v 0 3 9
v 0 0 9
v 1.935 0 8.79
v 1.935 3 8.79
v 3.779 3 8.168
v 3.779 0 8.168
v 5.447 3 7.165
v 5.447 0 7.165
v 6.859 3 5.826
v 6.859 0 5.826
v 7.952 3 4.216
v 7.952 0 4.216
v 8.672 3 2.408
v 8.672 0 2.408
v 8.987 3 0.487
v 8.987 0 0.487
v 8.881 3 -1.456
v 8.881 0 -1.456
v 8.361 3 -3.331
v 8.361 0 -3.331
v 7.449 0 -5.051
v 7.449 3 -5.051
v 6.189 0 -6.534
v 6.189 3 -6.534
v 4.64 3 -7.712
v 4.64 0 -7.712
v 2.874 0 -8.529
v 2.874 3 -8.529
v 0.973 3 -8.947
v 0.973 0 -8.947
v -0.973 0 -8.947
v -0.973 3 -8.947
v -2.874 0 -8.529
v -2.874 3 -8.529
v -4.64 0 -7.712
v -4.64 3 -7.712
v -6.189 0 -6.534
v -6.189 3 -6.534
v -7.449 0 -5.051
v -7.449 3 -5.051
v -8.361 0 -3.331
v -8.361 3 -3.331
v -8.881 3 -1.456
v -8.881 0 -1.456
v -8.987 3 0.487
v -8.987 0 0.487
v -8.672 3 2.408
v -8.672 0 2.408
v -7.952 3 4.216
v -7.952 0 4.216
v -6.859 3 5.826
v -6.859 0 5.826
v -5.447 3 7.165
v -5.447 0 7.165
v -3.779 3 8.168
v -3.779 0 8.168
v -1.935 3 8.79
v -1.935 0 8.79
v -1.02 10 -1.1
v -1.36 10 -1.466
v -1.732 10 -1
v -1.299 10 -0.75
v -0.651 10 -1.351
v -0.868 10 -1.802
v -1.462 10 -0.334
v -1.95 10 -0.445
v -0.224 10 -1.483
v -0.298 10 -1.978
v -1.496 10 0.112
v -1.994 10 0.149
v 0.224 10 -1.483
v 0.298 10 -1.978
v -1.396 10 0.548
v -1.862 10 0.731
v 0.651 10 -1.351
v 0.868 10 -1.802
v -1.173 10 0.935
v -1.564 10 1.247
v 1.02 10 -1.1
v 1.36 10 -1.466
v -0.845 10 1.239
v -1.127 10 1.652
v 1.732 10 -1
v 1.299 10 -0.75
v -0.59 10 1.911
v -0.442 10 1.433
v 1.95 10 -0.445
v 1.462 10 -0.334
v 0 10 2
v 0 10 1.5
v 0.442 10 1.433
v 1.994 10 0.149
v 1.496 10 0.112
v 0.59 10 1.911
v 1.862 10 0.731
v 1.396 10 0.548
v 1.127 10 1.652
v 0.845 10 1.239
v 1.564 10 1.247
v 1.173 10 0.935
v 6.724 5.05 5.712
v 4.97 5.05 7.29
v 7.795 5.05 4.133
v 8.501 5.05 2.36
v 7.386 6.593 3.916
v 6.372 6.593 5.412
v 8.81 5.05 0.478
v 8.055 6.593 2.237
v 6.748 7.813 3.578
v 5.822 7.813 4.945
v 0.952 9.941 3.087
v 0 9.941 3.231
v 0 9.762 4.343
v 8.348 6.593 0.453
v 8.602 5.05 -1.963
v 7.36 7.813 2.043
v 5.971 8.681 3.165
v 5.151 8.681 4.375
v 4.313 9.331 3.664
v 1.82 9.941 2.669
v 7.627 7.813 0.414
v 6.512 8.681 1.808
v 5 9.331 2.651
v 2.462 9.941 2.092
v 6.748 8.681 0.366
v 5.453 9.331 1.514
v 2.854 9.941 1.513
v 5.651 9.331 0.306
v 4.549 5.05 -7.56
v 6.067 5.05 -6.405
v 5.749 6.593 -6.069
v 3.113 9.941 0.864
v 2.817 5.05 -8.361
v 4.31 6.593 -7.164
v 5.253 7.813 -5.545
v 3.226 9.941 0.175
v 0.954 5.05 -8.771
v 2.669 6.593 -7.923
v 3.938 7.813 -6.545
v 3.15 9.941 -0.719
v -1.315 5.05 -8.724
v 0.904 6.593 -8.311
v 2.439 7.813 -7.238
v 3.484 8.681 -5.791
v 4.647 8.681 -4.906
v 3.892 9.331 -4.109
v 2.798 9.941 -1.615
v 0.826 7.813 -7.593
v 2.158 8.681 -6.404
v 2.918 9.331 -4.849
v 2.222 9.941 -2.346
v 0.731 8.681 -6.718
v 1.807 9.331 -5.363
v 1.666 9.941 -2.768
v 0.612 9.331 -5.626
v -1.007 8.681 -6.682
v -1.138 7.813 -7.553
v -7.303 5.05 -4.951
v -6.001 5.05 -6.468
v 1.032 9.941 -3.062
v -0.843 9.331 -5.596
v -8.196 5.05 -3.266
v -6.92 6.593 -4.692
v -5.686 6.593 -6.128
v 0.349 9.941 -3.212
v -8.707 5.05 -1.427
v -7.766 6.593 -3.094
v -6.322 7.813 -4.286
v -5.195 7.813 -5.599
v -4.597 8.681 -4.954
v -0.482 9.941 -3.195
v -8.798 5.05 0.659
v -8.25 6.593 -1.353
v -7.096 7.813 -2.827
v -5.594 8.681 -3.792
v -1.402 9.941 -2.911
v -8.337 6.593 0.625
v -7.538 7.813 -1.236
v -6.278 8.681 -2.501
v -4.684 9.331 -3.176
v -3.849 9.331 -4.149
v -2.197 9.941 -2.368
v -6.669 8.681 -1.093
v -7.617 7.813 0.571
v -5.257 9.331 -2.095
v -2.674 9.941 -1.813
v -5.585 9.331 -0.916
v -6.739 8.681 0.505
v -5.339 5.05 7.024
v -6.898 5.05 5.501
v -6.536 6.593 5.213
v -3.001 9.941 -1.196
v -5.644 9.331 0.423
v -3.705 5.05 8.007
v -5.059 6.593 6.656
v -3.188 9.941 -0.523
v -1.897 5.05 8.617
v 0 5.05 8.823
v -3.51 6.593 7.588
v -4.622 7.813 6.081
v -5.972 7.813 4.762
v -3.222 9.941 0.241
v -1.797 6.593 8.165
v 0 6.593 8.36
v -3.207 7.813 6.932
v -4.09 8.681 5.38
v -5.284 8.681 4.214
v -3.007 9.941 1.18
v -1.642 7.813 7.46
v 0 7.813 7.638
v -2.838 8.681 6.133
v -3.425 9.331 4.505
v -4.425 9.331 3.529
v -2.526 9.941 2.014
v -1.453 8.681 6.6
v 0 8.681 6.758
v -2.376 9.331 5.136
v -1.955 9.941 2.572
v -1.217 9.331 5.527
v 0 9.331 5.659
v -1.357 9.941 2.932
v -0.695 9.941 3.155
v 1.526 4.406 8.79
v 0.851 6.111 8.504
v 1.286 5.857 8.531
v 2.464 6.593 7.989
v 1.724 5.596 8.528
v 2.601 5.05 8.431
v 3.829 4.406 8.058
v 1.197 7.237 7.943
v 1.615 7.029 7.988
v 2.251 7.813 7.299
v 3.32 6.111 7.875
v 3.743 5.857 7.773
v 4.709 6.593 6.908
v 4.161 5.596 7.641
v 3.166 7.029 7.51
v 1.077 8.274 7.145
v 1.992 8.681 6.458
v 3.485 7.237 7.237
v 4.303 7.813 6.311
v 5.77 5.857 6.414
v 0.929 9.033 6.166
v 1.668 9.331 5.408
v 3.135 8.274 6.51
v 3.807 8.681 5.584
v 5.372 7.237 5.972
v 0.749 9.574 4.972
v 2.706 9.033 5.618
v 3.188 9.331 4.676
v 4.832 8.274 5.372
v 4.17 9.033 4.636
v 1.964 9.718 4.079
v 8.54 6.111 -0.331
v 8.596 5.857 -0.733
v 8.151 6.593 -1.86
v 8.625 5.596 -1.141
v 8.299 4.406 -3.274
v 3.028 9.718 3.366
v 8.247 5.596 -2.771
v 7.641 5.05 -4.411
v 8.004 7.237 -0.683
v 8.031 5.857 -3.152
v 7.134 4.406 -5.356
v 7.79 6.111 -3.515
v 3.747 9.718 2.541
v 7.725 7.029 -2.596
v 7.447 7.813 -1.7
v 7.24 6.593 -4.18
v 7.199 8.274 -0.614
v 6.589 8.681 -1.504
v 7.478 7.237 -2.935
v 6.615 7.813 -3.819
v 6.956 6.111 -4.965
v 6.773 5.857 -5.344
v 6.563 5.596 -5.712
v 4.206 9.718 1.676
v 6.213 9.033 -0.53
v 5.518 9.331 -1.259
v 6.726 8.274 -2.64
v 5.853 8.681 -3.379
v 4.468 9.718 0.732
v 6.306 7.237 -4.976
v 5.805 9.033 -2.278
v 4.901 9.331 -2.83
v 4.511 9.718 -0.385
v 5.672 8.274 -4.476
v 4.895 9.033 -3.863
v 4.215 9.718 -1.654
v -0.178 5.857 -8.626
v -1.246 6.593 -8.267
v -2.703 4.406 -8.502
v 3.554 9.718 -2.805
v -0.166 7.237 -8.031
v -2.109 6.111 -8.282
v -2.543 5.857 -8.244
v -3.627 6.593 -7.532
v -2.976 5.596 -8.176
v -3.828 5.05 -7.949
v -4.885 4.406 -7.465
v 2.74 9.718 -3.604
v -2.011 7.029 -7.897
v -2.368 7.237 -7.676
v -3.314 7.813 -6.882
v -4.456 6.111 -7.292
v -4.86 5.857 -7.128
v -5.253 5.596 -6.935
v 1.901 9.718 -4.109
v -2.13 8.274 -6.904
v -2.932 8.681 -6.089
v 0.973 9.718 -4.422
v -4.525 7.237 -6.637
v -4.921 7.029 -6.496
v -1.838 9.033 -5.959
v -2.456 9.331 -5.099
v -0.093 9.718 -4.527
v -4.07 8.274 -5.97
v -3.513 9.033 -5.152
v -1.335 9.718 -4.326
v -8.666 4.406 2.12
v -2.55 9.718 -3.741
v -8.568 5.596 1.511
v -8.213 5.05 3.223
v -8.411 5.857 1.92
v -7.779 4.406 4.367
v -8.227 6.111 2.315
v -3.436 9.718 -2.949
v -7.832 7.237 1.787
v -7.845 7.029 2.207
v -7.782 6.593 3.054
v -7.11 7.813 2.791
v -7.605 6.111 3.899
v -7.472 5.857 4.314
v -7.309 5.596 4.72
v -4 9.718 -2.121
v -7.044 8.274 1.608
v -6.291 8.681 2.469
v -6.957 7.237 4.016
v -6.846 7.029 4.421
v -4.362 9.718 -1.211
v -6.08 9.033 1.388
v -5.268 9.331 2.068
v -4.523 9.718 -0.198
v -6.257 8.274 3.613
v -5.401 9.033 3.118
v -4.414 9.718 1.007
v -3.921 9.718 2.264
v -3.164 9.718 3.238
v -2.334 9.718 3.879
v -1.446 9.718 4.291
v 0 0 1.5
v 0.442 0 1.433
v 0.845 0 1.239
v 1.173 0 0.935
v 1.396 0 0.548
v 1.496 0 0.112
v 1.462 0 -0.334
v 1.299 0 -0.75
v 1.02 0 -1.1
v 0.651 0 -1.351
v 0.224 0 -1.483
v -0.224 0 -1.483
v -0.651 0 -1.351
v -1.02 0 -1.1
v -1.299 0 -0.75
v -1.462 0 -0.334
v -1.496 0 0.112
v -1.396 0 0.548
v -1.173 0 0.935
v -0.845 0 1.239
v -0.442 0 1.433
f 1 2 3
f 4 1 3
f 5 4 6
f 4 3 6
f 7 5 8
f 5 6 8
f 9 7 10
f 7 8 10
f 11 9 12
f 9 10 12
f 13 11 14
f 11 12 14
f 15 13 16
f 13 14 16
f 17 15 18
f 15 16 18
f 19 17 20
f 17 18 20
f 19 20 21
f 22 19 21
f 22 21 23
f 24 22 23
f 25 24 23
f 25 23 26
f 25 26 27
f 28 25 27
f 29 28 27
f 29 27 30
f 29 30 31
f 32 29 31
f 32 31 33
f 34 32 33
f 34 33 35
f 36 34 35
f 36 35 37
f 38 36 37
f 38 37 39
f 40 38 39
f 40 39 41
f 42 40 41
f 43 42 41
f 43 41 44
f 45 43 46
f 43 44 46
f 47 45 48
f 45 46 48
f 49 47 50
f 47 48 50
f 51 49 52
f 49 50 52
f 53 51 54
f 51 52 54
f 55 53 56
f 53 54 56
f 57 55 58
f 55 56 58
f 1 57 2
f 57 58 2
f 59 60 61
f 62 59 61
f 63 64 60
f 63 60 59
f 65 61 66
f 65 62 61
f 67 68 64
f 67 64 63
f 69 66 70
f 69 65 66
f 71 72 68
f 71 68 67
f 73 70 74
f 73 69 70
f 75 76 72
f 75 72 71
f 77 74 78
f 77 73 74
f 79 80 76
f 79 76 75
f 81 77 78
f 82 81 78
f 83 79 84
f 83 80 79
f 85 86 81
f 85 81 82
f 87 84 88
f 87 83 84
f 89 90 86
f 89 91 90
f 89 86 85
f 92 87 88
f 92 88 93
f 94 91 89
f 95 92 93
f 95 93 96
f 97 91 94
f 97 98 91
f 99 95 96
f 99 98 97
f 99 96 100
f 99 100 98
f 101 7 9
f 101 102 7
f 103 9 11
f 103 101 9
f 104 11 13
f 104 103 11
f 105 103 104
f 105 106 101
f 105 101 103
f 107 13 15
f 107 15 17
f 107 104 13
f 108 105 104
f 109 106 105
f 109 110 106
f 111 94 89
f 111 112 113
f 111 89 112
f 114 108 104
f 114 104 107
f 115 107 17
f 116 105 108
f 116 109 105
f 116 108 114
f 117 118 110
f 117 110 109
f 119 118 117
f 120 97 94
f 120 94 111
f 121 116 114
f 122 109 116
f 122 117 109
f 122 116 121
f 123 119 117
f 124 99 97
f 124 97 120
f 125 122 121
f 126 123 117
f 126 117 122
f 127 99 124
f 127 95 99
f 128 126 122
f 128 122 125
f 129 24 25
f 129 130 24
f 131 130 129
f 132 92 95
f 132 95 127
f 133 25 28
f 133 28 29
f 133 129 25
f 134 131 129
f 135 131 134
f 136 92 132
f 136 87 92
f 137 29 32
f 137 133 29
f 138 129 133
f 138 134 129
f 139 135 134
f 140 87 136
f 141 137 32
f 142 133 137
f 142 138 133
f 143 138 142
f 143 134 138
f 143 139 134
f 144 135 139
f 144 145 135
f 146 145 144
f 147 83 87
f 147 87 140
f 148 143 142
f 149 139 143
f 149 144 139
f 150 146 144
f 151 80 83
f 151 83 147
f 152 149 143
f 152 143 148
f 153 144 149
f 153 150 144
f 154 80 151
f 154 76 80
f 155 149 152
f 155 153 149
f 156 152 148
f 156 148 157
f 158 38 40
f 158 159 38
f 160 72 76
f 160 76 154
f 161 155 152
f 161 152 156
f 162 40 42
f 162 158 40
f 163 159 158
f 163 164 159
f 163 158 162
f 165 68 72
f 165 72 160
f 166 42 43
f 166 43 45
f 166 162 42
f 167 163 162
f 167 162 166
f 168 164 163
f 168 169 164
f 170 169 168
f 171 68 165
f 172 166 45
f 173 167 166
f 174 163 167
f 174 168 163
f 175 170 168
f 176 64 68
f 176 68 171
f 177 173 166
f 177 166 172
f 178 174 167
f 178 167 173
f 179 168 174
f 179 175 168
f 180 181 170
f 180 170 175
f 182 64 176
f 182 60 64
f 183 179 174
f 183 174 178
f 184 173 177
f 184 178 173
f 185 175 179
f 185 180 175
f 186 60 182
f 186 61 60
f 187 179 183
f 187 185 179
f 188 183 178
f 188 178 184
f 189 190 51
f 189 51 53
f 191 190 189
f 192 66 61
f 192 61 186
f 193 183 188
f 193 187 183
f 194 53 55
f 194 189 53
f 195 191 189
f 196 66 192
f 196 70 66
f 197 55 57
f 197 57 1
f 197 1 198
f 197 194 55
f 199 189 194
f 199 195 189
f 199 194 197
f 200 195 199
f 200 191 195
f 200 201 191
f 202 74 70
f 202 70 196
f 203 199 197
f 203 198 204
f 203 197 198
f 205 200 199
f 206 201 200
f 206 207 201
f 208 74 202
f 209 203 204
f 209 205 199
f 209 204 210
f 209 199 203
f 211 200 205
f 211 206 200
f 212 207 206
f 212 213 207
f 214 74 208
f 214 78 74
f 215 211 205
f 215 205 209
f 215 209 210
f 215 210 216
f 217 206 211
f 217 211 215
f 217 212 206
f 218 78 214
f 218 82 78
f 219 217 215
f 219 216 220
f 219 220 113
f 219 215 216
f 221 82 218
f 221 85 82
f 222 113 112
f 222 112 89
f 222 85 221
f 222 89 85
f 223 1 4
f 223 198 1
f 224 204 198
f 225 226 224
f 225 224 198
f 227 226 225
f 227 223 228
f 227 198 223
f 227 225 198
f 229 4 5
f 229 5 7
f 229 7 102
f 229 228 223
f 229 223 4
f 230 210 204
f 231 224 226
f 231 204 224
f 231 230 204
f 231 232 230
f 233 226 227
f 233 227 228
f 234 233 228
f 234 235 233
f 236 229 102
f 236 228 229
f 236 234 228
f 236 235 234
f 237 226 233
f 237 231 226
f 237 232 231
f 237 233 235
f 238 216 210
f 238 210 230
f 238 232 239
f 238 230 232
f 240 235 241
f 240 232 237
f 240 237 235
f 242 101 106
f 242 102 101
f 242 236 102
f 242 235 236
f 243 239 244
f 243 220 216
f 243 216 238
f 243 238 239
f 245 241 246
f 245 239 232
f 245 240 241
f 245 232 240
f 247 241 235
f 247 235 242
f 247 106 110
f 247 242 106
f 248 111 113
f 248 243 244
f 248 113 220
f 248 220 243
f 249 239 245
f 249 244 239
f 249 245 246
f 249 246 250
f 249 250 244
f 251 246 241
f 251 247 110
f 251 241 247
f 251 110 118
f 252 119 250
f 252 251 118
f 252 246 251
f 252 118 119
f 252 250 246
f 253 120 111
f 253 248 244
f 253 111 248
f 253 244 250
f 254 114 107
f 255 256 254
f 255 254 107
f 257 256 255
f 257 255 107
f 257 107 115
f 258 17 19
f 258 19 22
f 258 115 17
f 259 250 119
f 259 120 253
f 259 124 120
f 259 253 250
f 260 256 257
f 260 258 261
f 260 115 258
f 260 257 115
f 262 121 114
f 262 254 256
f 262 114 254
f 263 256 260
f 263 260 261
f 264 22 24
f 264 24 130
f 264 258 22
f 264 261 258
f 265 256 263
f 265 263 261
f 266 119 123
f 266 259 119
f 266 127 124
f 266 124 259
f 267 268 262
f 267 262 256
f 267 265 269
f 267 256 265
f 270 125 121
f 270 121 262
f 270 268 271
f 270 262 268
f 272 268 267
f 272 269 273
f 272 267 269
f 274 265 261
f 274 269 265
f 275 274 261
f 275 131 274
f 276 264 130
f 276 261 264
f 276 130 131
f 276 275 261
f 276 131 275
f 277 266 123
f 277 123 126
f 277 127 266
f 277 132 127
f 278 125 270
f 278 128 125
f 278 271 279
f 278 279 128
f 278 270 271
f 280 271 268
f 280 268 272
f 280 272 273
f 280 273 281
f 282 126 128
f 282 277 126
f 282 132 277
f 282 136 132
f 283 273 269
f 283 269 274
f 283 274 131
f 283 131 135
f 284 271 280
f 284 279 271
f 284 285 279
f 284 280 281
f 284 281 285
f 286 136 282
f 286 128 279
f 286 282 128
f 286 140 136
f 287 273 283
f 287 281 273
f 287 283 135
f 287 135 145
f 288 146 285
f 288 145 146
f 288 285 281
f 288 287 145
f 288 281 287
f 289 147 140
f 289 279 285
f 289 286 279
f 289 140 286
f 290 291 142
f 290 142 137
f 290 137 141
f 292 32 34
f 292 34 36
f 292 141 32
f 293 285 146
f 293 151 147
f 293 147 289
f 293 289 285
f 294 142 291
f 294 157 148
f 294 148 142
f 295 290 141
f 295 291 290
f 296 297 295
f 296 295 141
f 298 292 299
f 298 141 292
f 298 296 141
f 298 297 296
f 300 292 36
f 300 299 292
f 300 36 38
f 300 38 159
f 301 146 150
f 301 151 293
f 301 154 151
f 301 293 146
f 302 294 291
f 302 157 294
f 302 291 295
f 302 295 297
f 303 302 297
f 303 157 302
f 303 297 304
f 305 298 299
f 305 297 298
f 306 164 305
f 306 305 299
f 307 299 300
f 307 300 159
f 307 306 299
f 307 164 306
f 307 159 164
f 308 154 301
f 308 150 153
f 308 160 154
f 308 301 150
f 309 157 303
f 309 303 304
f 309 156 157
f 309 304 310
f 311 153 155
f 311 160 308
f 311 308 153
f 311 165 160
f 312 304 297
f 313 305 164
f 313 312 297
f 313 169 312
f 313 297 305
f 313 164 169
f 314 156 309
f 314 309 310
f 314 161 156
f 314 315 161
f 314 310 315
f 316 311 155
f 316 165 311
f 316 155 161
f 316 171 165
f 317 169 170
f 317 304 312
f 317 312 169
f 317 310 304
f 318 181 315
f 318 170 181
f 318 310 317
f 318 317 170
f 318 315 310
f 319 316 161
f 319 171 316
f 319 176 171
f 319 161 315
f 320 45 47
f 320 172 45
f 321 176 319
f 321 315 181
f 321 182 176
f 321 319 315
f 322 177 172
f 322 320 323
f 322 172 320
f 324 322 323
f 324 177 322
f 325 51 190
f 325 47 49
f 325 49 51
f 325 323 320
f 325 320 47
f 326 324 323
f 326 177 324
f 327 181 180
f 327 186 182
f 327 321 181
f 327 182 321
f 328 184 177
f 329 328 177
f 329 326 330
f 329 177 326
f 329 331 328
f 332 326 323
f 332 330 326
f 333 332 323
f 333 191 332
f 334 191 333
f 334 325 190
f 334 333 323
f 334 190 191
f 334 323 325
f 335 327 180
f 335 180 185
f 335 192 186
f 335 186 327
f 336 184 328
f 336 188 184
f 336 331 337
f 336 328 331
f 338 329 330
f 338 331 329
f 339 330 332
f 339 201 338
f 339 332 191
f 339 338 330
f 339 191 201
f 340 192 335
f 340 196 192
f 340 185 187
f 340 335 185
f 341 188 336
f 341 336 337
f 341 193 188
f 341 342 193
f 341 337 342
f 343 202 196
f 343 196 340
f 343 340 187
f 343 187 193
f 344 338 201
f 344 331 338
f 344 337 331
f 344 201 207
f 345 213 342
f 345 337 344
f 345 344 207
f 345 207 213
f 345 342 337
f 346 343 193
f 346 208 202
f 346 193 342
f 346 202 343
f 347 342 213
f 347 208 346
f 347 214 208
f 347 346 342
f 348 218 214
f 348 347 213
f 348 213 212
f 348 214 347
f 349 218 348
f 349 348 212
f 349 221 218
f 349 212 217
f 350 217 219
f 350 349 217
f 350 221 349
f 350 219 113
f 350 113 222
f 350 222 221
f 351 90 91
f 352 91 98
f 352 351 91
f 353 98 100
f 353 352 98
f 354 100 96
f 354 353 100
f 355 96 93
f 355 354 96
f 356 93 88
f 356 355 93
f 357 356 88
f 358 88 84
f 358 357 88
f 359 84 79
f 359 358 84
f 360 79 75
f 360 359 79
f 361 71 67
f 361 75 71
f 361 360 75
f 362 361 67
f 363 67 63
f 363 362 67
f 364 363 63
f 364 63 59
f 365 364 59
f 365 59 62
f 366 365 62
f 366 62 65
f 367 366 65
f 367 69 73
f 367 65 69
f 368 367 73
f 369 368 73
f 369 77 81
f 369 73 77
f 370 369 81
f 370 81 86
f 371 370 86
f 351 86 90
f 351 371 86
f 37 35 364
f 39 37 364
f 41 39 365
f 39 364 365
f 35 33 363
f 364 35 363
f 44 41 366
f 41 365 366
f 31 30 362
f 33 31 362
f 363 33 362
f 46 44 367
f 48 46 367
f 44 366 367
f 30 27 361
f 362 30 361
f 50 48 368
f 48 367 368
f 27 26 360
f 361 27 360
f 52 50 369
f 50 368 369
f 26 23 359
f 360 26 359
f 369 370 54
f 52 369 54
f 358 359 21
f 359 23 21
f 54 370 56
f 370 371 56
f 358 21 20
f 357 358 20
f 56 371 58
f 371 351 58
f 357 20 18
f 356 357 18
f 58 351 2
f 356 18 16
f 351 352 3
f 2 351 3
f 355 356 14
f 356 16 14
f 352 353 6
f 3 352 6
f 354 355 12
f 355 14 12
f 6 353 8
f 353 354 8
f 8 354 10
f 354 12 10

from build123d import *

# Parameters (mm, degrees)
SZKIC1_R                    = 9
DODANIE_WYCI_GNI_CIE1_DEPTH = 10
ZAOKR_GLENIE1_SIZE          = 7
WYTNIJ_WYCI_GNI_CIE1_REACH  = 18.186
SZKIC2_R                    = 1.5


with BuildPart() as part:
    # Szkic1 → Dodanie-wyciągnięcie1 (new body)
    with BuildSketch(Plane(origin=(0, 0, 0), x_dir=(1, 0, 0), z_dir=(0, 1, 0))):
        with Locations(Location((0, 0, 0), (0, 0, 270))):
            Circle(SZKIC1_R)
    extrude(amount=DODANIE_WYCI_GNI_CIE1_DEPTH)

    # Zaokrąglenie1
    # a fillet whose section is not a circle: 7 mm, written as the material it takes off along each edge
    with BuildSketch(Plane(origin=(0, 10, 0), x_dir=(0, 0, 1), z_dir=(-1, 0, 0))) as zaokr_glenie1_piece_1:
        with BuildLine():
            Bezier((9, -ZAOKR_GLENIE1_SIZE), (9, 0), (9 - ZAOKR_GLENIE1_SIZE, 0), weights=[1, 1, 1])
            Line((9 - ZAOKR_GLENIE1_SIZE, 0), (9, 0))
            Line((9, 0), (9, -ZAOKR_GLENIE1_SIZE))
        make_face()
    revolve(axis=Axis((0, 10, 0), (0, 1, 0)), mode=Mode.SUBTRACT)

    # Szkic2 → Wytnij-wyciągnięcie1 (cut, up to next)
    with BuildSketch(Plane(origin=(0, 0, 0), x_dir=(1, 0, 0), z_dir=(0, 1, 0)), mode=Mode.PRIVATE) as wytnij_wyci_gni_cie1_sk1:
        with Locations(Location((0, 0, 0), (0, 0, 270))):
            Circle(SZKIC2_R)
    wytnij_wyci_gni_cie1_tool1 = extrude(wytnij_wyci_gni_cie1_sk1.sketch, amount=WYTNIJ_WYCI_GNI_CIE1_REACH, mode=Mode.PRIVATE) & part.part
    add(wytnij_wyci_gni_cie1_tool1.solids().sort_by_distance((0, 0, 0))[0], mode=Mode.SUBTRACT)


solid = part.part
